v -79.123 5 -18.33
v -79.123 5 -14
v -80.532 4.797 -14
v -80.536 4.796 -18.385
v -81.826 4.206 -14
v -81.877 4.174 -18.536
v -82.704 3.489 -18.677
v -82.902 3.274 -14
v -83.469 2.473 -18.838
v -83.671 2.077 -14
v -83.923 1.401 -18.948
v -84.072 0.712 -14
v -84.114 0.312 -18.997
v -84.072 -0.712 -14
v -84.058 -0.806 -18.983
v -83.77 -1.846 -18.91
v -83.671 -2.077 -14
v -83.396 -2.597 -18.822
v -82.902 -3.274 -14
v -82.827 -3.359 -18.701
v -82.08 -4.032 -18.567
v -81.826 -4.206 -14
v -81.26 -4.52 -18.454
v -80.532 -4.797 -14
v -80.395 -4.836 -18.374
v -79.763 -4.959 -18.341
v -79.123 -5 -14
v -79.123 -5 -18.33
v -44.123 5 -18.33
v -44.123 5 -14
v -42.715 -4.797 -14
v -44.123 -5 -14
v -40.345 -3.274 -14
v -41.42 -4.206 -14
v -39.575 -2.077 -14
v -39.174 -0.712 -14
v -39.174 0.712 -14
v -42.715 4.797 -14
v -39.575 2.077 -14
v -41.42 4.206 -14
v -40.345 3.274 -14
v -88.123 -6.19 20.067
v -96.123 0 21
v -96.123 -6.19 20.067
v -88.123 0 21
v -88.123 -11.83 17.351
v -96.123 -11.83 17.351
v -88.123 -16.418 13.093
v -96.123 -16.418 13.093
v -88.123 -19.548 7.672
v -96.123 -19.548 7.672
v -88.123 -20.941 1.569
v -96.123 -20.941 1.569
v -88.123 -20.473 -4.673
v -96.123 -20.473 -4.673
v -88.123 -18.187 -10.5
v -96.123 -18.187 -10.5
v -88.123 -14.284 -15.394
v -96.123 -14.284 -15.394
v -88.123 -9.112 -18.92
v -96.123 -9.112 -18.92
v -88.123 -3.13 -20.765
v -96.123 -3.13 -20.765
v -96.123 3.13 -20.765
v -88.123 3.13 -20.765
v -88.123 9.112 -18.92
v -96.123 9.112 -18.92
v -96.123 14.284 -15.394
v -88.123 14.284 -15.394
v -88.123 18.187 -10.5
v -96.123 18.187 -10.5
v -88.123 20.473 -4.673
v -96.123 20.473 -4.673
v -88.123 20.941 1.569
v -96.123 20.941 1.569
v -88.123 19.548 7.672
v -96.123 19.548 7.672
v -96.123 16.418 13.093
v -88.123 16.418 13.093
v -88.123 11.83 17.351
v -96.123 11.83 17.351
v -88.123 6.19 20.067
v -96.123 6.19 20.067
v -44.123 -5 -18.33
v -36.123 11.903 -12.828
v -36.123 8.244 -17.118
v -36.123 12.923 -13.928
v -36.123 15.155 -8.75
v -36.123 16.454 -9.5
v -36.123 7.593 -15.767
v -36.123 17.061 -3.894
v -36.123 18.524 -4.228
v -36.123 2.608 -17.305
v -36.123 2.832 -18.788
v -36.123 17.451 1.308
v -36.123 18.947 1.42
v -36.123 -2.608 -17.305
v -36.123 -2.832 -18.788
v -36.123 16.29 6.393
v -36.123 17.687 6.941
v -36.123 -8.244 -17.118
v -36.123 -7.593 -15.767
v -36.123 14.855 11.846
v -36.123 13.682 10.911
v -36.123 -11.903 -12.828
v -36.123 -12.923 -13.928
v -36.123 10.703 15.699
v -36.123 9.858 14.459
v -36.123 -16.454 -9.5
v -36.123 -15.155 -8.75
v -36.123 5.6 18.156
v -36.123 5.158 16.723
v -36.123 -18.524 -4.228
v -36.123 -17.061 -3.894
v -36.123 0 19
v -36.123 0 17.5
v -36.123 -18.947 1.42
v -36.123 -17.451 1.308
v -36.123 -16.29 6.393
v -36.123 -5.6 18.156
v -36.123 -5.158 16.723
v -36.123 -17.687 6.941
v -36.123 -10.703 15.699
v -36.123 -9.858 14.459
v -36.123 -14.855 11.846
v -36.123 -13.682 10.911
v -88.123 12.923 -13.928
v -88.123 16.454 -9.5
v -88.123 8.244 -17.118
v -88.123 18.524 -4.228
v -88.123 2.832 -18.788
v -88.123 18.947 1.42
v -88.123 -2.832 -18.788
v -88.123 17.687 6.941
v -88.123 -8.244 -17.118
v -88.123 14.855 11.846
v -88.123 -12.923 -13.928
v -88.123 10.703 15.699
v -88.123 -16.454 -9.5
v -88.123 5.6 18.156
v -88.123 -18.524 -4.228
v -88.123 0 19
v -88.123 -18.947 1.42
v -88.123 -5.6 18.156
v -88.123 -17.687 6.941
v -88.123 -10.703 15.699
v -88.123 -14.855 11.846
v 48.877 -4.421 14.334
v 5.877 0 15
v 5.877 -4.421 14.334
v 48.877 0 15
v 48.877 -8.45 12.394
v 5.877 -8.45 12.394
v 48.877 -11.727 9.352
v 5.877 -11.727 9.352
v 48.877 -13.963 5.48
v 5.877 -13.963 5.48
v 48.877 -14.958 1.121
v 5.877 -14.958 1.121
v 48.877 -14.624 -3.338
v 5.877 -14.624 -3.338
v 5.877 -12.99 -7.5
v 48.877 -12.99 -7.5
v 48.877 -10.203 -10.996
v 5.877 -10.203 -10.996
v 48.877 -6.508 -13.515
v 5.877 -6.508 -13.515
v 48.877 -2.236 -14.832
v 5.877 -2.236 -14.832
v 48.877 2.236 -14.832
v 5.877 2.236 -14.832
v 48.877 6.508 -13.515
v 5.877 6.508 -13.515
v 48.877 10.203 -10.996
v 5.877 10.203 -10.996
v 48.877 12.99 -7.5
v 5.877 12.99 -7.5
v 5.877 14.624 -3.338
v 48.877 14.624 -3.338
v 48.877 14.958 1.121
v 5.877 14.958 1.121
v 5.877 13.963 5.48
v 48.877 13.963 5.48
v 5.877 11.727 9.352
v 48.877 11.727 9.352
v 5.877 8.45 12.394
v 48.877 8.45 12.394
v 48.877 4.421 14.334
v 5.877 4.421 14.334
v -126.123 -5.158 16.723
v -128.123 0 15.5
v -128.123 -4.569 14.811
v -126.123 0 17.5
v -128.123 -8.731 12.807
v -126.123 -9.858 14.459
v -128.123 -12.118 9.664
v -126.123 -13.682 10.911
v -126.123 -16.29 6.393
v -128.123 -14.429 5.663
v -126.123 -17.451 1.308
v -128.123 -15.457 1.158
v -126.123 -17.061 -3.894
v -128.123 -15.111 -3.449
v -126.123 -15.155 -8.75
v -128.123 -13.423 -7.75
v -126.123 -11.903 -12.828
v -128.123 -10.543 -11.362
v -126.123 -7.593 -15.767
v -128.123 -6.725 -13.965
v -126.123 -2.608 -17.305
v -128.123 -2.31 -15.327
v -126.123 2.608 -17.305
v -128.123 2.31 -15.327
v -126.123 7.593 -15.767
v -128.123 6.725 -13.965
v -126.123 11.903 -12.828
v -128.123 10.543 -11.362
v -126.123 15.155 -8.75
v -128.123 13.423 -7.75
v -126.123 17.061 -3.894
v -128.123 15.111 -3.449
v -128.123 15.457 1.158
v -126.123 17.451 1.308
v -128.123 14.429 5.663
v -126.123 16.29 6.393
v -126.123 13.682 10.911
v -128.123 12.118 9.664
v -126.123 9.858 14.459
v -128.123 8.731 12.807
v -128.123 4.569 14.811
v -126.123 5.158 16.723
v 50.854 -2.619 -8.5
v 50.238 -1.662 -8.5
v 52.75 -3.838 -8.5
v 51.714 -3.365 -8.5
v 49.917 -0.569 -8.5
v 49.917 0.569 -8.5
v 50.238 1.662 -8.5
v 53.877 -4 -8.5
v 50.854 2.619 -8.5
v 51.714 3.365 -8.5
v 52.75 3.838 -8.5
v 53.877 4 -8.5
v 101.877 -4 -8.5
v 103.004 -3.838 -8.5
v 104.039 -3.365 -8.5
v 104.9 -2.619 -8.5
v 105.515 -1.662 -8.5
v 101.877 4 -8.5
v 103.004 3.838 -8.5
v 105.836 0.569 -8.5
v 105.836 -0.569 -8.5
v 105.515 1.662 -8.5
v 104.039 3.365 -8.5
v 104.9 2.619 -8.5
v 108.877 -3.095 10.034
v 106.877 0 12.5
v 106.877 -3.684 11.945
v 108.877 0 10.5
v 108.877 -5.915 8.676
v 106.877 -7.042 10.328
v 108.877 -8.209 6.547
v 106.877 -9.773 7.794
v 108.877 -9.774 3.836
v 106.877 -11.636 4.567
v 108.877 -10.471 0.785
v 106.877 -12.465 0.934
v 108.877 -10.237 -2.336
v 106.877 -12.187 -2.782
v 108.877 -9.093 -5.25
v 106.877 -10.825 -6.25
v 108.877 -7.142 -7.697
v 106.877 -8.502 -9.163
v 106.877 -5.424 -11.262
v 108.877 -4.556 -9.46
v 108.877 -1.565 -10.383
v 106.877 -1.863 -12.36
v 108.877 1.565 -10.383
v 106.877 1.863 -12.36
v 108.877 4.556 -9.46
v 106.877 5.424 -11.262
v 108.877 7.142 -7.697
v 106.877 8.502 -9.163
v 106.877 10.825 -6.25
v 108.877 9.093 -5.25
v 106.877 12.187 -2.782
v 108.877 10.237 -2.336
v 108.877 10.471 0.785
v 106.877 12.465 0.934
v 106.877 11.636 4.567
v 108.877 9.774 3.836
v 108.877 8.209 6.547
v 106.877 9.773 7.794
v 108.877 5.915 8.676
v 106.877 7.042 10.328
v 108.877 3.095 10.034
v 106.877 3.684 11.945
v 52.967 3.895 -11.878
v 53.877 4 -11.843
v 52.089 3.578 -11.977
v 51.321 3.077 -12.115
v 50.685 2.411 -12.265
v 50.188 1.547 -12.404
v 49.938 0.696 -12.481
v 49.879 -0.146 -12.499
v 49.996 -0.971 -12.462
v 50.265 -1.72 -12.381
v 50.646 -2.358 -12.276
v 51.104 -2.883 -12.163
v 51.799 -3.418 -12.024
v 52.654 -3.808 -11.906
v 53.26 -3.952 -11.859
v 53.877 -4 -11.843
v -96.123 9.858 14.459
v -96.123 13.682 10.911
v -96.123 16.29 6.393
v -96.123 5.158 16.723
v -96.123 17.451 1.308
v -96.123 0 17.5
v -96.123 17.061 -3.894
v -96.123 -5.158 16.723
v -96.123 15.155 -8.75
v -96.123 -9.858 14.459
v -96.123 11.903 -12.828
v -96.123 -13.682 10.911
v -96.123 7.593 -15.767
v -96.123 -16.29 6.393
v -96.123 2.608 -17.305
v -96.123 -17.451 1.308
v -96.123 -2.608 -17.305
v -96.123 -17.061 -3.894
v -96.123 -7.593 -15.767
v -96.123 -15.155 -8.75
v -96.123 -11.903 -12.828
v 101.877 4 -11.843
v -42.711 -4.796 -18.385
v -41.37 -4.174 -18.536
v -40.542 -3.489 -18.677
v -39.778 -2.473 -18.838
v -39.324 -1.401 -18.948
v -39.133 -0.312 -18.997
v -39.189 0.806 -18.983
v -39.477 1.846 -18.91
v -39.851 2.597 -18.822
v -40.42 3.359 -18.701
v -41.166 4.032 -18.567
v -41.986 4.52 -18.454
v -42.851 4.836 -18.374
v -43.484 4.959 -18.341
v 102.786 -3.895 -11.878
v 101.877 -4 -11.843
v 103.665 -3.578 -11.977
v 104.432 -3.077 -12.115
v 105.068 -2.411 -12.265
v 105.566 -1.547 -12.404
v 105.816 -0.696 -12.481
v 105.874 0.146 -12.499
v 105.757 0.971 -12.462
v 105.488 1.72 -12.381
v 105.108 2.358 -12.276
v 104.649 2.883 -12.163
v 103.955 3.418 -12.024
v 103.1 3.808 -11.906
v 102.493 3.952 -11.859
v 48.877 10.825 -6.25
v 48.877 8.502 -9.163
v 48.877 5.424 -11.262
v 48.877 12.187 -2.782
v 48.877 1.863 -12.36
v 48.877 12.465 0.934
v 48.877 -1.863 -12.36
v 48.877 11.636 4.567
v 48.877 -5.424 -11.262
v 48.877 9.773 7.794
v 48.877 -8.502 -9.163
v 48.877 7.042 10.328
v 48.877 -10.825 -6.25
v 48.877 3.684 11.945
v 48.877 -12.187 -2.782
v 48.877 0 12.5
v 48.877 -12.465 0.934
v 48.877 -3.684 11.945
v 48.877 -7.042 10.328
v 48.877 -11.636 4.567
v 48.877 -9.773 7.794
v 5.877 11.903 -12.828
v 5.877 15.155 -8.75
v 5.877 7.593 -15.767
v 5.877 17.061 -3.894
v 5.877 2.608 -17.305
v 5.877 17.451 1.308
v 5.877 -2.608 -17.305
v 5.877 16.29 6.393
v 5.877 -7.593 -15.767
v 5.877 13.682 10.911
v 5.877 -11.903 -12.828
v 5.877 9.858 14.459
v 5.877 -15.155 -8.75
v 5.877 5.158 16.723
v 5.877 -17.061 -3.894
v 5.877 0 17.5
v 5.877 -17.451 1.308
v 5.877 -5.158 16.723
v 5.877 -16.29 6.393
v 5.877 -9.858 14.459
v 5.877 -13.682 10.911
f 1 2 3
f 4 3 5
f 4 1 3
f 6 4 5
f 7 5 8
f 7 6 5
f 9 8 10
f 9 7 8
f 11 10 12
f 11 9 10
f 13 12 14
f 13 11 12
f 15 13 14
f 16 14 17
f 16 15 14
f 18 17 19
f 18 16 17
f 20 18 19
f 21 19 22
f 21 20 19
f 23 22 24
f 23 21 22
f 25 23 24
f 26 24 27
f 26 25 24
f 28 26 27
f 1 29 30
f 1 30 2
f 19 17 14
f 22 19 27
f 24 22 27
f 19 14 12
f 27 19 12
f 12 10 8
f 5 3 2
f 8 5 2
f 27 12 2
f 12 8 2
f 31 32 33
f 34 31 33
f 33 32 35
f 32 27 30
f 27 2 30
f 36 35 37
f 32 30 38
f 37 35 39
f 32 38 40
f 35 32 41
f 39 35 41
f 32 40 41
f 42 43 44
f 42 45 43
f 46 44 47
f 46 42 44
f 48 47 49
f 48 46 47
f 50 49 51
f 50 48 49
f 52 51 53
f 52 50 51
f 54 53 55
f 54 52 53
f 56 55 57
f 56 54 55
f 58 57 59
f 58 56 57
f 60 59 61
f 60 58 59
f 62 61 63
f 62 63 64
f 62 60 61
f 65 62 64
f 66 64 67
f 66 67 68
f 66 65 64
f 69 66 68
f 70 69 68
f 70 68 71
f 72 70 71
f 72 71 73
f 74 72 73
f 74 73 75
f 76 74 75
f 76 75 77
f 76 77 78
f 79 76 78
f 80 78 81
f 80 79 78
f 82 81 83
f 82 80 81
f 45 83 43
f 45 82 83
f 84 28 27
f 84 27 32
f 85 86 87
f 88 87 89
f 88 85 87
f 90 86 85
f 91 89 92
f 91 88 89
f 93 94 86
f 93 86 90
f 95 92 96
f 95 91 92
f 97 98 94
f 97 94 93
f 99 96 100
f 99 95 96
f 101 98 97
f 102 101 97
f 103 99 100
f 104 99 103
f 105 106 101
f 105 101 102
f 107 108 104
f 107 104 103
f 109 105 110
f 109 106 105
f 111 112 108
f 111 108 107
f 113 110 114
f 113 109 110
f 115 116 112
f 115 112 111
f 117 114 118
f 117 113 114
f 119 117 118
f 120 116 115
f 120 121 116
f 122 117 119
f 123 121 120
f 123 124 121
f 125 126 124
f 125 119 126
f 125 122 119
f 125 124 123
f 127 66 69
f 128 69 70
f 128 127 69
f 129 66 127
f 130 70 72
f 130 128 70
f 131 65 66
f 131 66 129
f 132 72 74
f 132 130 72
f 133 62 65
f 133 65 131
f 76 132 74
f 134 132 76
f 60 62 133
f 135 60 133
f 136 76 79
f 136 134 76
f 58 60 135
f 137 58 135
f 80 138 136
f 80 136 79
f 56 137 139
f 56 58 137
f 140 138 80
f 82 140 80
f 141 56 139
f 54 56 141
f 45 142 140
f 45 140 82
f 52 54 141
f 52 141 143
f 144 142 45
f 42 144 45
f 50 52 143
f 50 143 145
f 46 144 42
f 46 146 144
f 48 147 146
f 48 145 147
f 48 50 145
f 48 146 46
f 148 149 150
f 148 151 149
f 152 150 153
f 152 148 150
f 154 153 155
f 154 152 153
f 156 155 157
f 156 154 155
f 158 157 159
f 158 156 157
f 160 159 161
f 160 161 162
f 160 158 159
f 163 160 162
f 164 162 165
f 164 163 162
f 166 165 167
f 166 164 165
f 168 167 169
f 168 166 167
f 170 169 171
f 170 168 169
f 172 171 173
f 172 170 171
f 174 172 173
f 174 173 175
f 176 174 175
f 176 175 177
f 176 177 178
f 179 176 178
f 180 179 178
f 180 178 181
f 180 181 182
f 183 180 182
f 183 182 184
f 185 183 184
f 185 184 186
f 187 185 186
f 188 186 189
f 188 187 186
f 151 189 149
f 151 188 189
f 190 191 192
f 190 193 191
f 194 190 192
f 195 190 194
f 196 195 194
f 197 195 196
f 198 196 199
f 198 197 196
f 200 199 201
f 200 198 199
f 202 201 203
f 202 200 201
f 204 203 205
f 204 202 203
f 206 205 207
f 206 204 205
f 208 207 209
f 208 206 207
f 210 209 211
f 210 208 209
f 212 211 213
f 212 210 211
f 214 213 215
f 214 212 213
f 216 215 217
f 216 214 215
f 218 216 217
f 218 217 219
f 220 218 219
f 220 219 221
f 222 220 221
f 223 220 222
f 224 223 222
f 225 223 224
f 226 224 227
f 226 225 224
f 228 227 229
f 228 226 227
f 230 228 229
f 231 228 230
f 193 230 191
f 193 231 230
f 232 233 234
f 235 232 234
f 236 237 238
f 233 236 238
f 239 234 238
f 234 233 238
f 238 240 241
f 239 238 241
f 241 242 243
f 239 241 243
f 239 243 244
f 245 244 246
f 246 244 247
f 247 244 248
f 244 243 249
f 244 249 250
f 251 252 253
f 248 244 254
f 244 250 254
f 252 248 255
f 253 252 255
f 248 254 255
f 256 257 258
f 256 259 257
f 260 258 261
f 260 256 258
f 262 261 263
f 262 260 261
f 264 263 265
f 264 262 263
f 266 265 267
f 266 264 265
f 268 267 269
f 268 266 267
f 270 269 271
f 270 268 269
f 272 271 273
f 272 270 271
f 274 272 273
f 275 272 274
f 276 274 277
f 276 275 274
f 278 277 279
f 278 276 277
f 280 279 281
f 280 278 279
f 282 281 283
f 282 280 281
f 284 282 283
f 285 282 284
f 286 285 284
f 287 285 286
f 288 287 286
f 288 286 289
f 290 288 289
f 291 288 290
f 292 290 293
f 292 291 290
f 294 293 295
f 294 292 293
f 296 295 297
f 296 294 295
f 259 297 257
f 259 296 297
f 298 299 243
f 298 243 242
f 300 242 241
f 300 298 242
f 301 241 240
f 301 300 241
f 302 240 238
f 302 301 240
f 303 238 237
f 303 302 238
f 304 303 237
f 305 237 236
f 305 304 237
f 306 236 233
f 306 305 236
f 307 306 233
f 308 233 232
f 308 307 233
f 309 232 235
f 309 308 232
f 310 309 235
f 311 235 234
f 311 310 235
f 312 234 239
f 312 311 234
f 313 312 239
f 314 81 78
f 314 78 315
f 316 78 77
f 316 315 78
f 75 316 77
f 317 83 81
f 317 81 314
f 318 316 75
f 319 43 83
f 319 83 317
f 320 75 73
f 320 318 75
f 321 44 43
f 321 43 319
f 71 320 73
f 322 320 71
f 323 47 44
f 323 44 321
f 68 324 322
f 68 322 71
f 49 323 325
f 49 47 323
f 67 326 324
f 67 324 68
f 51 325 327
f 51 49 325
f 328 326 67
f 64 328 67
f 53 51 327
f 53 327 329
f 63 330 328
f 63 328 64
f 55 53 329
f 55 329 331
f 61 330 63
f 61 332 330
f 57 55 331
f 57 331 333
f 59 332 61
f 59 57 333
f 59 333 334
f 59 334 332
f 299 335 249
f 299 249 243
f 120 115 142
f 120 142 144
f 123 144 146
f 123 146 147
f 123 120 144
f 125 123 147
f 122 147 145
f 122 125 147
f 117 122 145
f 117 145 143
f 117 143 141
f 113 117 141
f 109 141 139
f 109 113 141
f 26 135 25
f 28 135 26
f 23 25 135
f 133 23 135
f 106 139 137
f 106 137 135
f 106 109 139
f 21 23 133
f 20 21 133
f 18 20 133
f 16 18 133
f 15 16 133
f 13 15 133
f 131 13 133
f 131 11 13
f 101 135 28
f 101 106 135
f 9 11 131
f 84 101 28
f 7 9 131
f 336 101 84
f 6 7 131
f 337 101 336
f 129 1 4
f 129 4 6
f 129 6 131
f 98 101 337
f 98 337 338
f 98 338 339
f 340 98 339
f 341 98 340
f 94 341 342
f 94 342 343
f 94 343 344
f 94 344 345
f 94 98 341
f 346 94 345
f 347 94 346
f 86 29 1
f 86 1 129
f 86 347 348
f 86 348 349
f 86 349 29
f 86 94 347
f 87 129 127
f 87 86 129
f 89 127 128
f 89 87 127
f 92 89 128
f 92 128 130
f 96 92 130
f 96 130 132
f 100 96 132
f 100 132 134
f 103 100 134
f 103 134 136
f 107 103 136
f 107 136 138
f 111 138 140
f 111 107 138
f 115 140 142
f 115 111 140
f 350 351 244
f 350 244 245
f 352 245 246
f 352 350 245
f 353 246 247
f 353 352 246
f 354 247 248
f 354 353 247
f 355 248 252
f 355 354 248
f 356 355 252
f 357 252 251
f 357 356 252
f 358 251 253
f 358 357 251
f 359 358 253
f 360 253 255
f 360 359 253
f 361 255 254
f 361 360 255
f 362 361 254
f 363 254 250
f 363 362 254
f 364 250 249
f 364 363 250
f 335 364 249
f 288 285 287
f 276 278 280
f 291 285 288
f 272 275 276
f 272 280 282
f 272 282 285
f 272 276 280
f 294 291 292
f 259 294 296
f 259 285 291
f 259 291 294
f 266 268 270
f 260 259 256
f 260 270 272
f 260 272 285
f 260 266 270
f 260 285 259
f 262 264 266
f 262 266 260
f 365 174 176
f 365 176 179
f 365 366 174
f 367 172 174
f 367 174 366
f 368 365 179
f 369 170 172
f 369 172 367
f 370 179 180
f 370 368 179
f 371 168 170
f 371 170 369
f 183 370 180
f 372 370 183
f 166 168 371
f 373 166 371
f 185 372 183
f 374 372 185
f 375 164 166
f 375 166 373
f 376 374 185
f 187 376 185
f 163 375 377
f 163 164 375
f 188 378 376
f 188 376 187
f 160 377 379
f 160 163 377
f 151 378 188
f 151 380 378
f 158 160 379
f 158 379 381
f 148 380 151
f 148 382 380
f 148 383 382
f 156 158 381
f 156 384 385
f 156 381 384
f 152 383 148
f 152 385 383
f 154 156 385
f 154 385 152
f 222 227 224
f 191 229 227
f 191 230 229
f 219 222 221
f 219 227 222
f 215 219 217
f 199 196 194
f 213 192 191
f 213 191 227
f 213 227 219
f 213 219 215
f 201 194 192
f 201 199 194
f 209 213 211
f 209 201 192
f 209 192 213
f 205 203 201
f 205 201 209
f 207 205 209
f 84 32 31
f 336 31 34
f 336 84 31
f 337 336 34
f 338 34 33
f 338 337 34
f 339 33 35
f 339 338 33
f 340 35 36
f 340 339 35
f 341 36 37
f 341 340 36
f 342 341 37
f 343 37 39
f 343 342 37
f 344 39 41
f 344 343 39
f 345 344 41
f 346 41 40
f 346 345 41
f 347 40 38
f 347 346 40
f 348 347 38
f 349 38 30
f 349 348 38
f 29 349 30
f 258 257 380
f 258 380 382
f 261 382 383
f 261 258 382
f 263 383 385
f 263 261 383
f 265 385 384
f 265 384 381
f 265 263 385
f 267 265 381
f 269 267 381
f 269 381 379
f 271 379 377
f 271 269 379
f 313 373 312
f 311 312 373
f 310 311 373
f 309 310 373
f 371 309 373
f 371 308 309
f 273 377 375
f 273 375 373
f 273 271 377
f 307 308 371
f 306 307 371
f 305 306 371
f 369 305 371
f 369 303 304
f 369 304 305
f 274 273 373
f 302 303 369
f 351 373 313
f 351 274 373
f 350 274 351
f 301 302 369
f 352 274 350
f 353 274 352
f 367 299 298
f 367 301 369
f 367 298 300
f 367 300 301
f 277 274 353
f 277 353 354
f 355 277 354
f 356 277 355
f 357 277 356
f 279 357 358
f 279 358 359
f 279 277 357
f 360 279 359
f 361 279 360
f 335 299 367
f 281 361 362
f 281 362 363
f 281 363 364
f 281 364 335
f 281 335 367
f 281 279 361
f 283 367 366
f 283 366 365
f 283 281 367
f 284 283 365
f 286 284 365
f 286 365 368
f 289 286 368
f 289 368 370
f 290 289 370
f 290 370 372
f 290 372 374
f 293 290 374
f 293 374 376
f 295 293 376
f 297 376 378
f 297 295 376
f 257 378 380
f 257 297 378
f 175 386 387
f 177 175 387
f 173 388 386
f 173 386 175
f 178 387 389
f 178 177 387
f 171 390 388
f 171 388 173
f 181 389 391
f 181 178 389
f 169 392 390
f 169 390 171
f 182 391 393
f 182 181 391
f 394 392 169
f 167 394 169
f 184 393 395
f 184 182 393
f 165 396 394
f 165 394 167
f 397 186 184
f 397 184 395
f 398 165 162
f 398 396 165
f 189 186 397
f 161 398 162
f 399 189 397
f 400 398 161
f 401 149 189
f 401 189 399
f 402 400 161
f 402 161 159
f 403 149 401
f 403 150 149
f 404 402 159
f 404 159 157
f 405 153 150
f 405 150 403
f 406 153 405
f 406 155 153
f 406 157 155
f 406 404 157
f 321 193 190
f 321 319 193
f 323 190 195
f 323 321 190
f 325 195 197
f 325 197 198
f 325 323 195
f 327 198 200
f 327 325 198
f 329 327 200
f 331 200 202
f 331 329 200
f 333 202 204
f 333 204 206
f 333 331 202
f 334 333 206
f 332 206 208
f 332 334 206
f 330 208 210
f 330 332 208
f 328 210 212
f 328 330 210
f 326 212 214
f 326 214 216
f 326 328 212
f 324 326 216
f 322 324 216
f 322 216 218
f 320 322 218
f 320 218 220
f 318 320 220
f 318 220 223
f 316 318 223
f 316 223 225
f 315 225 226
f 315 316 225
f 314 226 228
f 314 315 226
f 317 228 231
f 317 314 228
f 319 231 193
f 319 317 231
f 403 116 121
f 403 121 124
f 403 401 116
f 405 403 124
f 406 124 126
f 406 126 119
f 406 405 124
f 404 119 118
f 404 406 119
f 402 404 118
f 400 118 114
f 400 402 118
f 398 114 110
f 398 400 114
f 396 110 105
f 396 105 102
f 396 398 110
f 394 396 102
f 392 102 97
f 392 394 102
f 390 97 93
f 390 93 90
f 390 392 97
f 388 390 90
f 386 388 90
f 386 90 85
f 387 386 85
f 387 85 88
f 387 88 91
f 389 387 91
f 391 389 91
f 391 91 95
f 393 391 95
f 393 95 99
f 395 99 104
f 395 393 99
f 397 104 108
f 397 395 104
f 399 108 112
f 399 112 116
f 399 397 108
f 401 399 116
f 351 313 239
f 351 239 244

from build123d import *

# Parameters (mm, degrees)
CUT_EXTRUDE_1_DEPTH = 4
CUT_EXTRUDE_2_DEPTH = 5


with BuildPart() as part:
    # 草图1 → 旋转1 (revolve)
    with BuildSketch(Plane(origin=(0, 0, 0), x_dir=(1, 0, 0), z_dir=(0, 1, 0)), mode=Mode.PRIVATE) as revolve_1_sk:
        Polygon((-128.123292873, 0), (-128.123292873, 15.5), (-126.123292873, 17.5), (-96.123292873, 17.5), (-96.123292873, 21), (-88.123292873, 21), (-88.123292873, 19), (-36.123292873, 19), (-36.123292873, 17.5), (5.876707127, 17.5), (5.876707127, 15), (48.876707127, 15), (48.876707127, 12.5), (106.876707127, 12.5), (108.876707127, 10.5), (108.876707127, 0), align=None)
    revolve(revolve_1_sk.sketch.rotate(Axis((-128.123292873, 0, 0), (1, 0, 0)), 180), axis=Axis((-128.123292873, 0, 0), (1, 0, 0)))

    # 草图2 → 切除-拉伸1 (cut)
    with BuildSketch(Plane(origin=(0, 0, -12.5), x_dir=(-1, 0, 0), z_dir=(0, 0, -1))):
        with BuildLine():
            Line((-101.876707127, 4), (-53.876707127, 4))
            ThreePointArc((-53.876707127, 4), (-49.876707127, 0), (-53.876707127, -4))
            Line((-53.876707127, -4), (-101.876707127, -4))
            ThreePointArc((-101.876707127, -4), (-105.876707127, 0), (-101.876707127, 4))
        make_face()
    extrude(amount=-CUT_EXTRUDE_1_DEPTH, mode=Mode.SUBTRACT)

    # 草图3 → 切除-拉伸2 (cut)
    with BuildSketch(Plane(origin=(0, 0, -19), x_dir=(-1, 0, 0), z_dir=(0, 0, -1))):
        with BuildLine():
            Line((44.123292873, 5), (79.123292873, 5))
            ThreePointArc((79.123292873, 5), (84.123292873, 0), (79.123292873, -5))
            Line((79.123292873, -5), (44.123292873, -5))
            ThreePointArc((44.123292873, -5), (39.123292873, 0), (44.123292873, 5))
        make_face()
    extrude(amount=-CUT_EXTRUDE_2_DEPTH, mode=Mode.SUBTRACT)


solid = part.part
